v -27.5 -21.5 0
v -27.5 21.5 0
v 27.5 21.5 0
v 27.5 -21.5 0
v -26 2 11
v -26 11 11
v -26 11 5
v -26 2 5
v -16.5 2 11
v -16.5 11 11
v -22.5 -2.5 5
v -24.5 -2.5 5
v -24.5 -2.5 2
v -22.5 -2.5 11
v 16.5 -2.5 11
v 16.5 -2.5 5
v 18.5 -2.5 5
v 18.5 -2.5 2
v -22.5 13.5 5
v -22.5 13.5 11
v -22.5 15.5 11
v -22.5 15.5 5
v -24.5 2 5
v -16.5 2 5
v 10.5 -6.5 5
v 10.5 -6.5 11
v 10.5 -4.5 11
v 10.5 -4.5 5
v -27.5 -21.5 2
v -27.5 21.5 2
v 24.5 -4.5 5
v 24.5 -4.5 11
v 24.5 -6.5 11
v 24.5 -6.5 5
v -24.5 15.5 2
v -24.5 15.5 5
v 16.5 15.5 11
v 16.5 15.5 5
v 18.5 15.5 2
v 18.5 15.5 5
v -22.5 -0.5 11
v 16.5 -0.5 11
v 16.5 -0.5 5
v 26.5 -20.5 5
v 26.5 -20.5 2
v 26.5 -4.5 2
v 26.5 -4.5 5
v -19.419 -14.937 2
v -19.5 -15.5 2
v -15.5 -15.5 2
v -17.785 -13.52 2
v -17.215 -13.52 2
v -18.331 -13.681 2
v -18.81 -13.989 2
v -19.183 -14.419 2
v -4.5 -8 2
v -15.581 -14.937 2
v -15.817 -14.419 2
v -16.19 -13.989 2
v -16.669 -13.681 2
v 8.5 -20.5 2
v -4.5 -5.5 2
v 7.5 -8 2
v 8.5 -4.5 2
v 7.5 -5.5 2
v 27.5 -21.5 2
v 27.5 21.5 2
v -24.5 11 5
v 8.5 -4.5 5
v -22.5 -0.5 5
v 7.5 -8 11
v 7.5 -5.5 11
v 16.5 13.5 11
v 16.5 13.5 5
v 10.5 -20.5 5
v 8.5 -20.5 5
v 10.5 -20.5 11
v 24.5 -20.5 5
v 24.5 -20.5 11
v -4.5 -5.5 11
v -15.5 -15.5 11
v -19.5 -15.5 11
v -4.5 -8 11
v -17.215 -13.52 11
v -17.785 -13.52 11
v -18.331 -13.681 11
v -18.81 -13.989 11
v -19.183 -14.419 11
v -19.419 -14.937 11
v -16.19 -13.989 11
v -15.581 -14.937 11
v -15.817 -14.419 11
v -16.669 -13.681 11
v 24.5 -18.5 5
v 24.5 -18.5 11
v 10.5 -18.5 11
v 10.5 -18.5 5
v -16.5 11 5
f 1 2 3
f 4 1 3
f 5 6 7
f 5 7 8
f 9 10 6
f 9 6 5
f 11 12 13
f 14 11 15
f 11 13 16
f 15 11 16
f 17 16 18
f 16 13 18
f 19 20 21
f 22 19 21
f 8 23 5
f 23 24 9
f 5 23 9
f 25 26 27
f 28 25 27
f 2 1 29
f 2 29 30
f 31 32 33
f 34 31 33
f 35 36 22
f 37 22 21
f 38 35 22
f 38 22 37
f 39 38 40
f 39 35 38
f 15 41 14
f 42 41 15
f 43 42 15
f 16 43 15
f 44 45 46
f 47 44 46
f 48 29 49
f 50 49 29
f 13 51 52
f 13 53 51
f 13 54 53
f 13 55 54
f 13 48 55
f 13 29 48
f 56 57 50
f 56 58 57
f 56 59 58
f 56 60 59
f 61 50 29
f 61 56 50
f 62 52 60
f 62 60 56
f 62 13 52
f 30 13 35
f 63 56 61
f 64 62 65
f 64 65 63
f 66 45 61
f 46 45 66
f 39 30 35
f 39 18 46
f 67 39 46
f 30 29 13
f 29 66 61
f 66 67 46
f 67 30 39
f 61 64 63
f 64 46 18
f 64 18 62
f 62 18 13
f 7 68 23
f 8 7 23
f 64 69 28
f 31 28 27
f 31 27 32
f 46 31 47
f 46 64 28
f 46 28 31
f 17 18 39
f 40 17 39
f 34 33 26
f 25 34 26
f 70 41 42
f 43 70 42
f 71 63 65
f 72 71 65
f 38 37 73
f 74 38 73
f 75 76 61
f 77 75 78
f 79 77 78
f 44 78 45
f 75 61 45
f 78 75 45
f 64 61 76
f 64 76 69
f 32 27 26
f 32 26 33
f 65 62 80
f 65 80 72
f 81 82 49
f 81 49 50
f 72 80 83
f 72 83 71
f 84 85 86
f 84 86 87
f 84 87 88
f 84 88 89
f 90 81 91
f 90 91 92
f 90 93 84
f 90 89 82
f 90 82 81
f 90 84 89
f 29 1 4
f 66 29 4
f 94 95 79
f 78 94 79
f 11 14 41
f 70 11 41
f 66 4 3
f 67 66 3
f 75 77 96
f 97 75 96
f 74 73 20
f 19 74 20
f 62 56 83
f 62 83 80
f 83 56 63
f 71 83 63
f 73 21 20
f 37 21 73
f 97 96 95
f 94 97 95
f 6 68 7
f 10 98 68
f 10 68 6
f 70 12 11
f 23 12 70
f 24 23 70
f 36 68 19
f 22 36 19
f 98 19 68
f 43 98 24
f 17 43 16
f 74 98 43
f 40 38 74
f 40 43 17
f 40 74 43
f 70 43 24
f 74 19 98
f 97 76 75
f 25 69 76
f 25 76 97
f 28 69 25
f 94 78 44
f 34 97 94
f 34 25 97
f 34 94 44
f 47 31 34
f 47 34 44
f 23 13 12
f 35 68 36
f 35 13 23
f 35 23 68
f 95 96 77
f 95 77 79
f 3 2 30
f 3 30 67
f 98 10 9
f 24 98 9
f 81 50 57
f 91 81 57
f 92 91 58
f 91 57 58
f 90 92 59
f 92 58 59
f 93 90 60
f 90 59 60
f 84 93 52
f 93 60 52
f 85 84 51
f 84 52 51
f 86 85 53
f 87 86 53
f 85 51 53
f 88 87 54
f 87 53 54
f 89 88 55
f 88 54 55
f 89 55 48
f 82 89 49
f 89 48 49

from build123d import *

# Parameters (mm, degrees)
F0_W     = 55
F0_H     = 43
F1_DEPTH = 2
F2_W     = 43
F2_H     = 18
F2_W_2   = 12
F2_H_2   = 2.5
F2_W_3   = 18
F2_H_3   = 16
F3_DEPTH = 9
F5_DEPTH = 6
F6_W     = 9
F6_H     = 6
F7_DEPTH = 1.5


with BuildPart() as f1:
    # F0 (on Top) → F1 (new body)
    with BuildSketch(Plane.XY):
        Rectangle(F0_W, F0_H)
    extrude(amount=F1_DEPTH)

    # F2 (on face) → F3 (join)
    with BuildSketch(Plane.XY.offset(2)):
        with Locations((-3, 6.5)):
            Rectangle(F2_W, F2_H)
        with Locations((1.5, -6.75)):
            Rectangle(F2_W_2, F2_H_2)
        with Locations((17.5, -12.5)):
            Rectangle(F2_W_3, F2_H_3)
        with BuildLine():
            ThreePointArc((-15.5, -15.5), (-17.5, -13.5), (-19.5, -15.5))
            Line((-19.5, -15.5), (-15.5, -15.5))
        make_face()
    extrude(amount=F3_DEPTH)

    # F4 (on face) → F5 (cut)
    with BuildSketch(Plane.XY.offset(11)):
        Polygon((-22.5, 13.5), (-22.5, 15.5), (-24.5, 15.5), (-24.5, 11), (-16.5, 11), (-16.5, 2), (-24.5, 2), (-24.5, -2.5), (-22.5, -2.5), (-22.5, -0.5), (16.5, -0.5), (16.5, -2.5), (18.5, -2.5), (18.5, 15.5), (16.5, 15.5), (16.5, 13.5), align=None)
        Polygon((10.5, -4.5), (8.5, -4.5), (8.5, -20.5), (10.5, -20.5), (10.5, -18.5), (24.5, -18.5), (24.5, -20.5), (26.5, -20.5), (26.5, -4.5), (24.5, -4.5), (24.5, -6.5), (10.5, -6.5), align=None)
    extrude(amount=-F5_DEPTH, mode=Mode.SUBTRACT)

    # F6 (on face) → F7 (join)
    with BuildSketch(Plane(origin=(-24.5, 0, 0), x_dir=(0, -1, 0), z_dir=(-1, 0, 0))):
        with Locations((-6.5, 8)):
            Rectangle(F6_W, F6_H)
    extrude(amount=F7_DEPTH)


solid = f1.part
